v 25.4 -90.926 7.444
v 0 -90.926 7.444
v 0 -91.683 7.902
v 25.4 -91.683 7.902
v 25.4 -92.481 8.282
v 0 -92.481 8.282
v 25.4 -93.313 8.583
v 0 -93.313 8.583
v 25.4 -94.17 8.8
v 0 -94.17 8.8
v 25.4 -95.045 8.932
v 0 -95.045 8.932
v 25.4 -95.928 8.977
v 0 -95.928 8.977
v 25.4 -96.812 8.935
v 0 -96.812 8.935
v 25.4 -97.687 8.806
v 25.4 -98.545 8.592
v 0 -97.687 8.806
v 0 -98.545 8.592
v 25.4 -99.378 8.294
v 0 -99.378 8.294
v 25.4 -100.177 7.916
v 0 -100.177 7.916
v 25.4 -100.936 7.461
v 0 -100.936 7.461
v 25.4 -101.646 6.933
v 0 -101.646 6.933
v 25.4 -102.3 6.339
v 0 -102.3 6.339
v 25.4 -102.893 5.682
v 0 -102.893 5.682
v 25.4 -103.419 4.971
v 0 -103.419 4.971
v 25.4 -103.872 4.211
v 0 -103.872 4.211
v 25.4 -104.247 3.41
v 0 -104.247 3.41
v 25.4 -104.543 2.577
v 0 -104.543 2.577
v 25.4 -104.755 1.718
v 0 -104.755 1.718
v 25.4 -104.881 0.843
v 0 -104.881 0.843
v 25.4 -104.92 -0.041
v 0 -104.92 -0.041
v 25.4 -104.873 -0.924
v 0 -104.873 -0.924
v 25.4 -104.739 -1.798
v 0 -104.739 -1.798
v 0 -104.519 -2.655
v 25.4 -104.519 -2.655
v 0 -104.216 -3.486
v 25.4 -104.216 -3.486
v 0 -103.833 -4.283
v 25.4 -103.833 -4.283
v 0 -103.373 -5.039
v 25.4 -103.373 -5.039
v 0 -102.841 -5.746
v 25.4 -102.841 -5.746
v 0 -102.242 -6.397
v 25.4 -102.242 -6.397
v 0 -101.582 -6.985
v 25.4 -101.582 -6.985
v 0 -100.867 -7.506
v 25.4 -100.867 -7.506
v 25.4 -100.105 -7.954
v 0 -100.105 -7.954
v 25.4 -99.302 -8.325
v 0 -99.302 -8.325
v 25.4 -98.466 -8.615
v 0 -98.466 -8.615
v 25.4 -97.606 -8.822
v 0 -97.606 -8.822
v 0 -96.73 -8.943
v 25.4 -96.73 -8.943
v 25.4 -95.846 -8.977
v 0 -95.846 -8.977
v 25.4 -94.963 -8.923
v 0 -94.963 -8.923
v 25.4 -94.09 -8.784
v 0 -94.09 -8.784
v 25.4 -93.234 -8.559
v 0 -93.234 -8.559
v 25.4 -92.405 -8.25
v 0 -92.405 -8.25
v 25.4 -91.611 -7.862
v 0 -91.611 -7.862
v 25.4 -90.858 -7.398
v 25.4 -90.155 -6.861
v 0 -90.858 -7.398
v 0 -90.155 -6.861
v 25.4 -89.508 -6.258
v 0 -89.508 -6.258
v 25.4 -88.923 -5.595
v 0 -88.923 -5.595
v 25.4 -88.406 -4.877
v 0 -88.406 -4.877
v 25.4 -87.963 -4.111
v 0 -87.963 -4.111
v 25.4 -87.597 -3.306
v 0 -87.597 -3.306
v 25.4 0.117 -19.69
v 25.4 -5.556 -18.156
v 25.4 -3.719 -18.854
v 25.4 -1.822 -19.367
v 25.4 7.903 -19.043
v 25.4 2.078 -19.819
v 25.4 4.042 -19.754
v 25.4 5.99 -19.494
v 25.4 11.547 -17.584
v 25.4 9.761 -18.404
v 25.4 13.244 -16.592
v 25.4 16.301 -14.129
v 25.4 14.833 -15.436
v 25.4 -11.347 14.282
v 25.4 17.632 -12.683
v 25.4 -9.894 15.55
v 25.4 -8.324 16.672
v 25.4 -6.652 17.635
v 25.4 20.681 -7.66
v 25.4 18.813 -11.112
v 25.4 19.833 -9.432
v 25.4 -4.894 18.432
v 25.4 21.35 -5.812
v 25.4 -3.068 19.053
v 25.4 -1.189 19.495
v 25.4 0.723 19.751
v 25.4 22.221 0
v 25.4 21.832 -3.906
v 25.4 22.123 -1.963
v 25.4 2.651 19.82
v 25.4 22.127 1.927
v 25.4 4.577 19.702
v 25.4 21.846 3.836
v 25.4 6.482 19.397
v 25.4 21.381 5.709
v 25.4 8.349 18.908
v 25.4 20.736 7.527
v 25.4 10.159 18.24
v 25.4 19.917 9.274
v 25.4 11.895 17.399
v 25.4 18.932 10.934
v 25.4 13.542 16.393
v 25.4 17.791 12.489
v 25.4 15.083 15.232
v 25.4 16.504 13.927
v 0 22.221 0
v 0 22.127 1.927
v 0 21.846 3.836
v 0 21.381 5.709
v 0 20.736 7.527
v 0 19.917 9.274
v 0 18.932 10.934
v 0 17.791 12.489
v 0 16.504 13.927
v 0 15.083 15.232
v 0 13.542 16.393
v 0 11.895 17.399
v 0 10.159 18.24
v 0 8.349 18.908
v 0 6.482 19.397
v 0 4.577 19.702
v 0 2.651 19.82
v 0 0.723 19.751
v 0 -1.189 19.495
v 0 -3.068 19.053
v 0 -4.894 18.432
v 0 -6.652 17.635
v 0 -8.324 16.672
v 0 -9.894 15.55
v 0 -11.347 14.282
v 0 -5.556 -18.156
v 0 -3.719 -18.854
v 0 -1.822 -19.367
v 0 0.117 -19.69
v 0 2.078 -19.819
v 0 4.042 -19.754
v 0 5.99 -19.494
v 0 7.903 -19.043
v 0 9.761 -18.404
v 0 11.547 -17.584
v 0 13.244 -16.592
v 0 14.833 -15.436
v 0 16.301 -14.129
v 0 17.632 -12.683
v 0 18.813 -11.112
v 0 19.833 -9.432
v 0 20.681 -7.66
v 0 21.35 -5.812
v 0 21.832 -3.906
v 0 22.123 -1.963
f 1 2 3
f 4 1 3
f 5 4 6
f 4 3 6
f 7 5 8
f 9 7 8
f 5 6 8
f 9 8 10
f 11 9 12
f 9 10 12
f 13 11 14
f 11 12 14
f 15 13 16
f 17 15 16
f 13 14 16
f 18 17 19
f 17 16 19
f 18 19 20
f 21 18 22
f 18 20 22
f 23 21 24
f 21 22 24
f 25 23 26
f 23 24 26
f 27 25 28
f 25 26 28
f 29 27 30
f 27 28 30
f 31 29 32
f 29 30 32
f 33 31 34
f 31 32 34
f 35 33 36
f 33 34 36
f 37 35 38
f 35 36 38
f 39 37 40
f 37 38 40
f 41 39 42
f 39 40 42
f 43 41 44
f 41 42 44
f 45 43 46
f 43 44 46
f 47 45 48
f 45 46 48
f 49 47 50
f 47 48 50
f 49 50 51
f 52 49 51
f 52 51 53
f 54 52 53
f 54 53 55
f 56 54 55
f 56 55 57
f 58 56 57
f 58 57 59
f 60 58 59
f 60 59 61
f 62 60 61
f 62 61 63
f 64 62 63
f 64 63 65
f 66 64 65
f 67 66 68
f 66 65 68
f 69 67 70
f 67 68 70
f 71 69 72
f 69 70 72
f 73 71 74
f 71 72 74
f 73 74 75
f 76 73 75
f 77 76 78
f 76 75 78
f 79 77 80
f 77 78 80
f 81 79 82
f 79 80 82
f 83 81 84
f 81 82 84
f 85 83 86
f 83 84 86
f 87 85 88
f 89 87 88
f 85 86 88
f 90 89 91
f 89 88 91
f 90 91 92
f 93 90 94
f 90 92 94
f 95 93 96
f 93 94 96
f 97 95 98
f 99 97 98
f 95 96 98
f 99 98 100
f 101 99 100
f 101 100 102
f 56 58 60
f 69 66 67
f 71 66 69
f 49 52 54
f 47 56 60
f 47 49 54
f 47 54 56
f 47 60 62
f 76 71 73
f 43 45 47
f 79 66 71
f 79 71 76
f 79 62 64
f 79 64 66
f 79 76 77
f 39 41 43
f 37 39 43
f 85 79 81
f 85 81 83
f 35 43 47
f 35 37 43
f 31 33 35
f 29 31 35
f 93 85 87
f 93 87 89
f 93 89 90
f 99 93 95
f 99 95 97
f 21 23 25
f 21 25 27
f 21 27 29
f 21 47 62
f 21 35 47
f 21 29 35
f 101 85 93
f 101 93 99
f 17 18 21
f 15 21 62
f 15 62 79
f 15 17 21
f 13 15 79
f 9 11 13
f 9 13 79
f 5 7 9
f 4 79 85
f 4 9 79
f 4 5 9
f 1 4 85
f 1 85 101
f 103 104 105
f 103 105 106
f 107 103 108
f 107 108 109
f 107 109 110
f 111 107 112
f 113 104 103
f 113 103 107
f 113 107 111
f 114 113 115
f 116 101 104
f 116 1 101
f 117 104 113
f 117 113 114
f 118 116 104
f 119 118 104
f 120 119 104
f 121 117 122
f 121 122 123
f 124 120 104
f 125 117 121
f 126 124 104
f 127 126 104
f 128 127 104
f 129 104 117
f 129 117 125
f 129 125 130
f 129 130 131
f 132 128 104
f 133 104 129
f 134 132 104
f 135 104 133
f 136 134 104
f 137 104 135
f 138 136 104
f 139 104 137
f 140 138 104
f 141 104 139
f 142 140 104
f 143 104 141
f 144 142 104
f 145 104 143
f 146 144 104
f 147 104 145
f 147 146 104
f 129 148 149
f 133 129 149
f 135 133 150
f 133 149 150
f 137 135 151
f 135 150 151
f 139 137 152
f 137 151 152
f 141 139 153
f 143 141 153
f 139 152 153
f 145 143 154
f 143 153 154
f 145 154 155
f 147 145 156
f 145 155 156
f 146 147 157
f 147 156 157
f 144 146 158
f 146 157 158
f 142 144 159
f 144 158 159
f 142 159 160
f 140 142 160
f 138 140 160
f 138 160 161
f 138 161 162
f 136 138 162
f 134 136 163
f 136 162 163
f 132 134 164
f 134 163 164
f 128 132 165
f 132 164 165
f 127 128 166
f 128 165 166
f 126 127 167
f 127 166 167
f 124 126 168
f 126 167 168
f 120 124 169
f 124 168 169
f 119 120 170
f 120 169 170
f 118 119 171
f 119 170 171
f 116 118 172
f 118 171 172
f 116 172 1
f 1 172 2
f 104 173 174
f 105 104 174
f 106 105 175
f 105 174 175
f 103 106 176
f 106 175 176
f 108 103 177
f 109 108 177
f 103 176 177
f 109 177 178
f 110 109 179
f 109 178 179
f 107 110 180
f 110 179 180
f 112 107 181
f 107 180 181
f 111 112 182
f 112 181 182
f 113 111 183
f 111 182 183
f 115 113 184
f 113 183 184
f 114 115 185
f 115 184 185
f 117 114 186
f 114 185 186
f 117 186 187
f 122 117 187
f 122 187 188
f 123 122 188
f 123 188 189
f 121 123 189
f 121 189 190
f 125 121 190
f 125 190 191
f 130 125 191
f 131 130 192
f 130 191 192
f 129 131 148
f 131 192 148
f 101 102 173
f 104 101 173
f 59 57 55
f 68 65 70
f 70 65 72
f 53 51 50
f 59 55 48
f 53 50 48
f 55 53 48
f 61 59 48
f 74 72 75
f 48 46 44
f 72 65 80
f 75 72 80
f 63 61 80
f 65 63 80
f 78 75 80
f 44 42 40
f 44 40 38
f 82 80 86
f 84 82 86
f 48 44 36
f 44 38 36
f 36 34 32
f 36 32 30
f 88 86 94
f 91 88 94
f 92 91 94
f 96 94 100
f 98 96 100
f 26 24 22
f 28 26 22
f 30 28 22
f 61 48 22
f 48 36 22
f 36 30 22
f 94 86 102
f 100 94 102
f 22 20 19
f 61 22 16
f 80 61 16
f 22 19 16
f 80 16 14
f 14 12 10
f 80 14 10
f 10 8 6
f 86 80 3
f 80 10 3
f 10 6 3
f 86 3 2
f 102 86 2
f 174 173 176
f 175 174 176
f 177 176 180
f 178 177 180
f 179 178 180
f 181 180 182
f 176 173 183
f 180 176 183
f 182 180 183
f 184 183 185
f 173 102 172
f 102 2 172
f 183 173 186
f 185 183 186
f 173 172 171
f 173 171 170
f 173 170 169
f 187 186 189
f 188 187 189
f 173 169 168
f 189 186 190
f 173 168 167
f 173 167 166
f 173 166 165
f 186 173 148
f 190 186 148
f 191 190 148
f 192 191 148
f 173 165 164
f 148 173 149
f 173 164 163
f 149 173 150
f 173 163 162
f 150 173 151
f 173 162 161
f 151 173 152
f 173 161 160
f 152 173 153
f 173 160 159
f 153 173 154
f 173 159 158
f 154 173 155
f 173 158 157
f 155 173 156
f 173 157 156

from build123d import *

# Parameters (mm, degrees)
F2_DEPTH = 25.4
F3_DEPTH = 25.4


with BuildPart() as f2:
    # F0 (on Right) → F2 (new body)
    with BuildSketch(Plane.YZ):
        with BuildLine():
            ThreePointArc((-5.555995, -18.155882), (-17.114845, -3.483872), (-11.34728, 14.281546))
            Line((-11.34728, 14.281546), (-90.925781, 7.443868))
            ThreePointArc((-90.925781, 7.443868), (-88.017793, 4.215689), (-86.966366, 0))
            ThreePointArc((-86.966366, 0), (-87.125503, -1.682815), (-87.597275, -3.305968))
            Line((-87.597275, -3.305968), (-5.555995, -18.155882))
        make_face()
        with BuildLine():
            ThreePointArc((-86.966366, 0), (-88.017793, 4.215689), (-90.925781, 7.443868))
            ThreePointArc((-90.925781, 7.443868), (-104.518898, -2.655239), (-87.597275, -3.305968))
            ThreePointArc((-87.597275, -3.305968), (-87.125503, -1.682815), (-86.966366, 0))
        make_face()
        with BuildLine():
            ThreePointArc((-5.555995, -18.155882), (13.243766, -16.591974), (22.220583, 0))
            ThreePointArc((22.220583, 0), (10.158773, 18.239819), (-11.34728, 14.281546))
            ThreePointArc((-11.34728, 14.281546), (-17.114845, -3.483872), (-5.555995, -18.155882))
        make_face()
    extrude(amount=F2_DEPTH)

    # F0 (on Right) → F3 (join)
    with BuildSketch(Plane.YZ):
        with BuildLine():
            ThreePointArc((-5.555995, -18.155882), (13.243766, -16.591974), (22.220583, 0))
            ThreePointArc((22.220583, 0), (10.158773, 18.239819), (-11.34728, 14.281546))
            ThreePointArc((-11.34728, 14.281546), (-17.114845, -3.483872), (-5.555995, -18.155882))
        make_face()
        with BuildLine():
            ThreePointArc((-5.555995, -18.155882), (-17.114845, -3.483872), (-11.34728, 14.281546))
            Line((-11.34728, 14.281546), (-90.925781, 7.443868))
            ThreePointArc((-90.925781, 7.443868), (-88.017793, 4.215689), (-86.966366, 0))
            ThreePointArc((-86.966366, 0), (-87.125503, -1.682815), (-87.597275, -3.305968))
            Line((-87.597275, -3.305968), (-5.555995, -18.155882))
        make_face()
        with BuildLine():
            ThreePointArc((-86.966366, 0), (-88.017793, 4.215689), (-90.925781, 7.443868))
            ThreePointArc((-90.925781, 7.443868), (-104.518898, -2.655239), (-87.597275, -3.305968))
            ThreePointArc((-87.597275, -3.305968), (-87.125503, -1.682815), (-86.966366, 0))
        make_face()
    extrude(amount=F3_DEPTH)


solid = f2.part
